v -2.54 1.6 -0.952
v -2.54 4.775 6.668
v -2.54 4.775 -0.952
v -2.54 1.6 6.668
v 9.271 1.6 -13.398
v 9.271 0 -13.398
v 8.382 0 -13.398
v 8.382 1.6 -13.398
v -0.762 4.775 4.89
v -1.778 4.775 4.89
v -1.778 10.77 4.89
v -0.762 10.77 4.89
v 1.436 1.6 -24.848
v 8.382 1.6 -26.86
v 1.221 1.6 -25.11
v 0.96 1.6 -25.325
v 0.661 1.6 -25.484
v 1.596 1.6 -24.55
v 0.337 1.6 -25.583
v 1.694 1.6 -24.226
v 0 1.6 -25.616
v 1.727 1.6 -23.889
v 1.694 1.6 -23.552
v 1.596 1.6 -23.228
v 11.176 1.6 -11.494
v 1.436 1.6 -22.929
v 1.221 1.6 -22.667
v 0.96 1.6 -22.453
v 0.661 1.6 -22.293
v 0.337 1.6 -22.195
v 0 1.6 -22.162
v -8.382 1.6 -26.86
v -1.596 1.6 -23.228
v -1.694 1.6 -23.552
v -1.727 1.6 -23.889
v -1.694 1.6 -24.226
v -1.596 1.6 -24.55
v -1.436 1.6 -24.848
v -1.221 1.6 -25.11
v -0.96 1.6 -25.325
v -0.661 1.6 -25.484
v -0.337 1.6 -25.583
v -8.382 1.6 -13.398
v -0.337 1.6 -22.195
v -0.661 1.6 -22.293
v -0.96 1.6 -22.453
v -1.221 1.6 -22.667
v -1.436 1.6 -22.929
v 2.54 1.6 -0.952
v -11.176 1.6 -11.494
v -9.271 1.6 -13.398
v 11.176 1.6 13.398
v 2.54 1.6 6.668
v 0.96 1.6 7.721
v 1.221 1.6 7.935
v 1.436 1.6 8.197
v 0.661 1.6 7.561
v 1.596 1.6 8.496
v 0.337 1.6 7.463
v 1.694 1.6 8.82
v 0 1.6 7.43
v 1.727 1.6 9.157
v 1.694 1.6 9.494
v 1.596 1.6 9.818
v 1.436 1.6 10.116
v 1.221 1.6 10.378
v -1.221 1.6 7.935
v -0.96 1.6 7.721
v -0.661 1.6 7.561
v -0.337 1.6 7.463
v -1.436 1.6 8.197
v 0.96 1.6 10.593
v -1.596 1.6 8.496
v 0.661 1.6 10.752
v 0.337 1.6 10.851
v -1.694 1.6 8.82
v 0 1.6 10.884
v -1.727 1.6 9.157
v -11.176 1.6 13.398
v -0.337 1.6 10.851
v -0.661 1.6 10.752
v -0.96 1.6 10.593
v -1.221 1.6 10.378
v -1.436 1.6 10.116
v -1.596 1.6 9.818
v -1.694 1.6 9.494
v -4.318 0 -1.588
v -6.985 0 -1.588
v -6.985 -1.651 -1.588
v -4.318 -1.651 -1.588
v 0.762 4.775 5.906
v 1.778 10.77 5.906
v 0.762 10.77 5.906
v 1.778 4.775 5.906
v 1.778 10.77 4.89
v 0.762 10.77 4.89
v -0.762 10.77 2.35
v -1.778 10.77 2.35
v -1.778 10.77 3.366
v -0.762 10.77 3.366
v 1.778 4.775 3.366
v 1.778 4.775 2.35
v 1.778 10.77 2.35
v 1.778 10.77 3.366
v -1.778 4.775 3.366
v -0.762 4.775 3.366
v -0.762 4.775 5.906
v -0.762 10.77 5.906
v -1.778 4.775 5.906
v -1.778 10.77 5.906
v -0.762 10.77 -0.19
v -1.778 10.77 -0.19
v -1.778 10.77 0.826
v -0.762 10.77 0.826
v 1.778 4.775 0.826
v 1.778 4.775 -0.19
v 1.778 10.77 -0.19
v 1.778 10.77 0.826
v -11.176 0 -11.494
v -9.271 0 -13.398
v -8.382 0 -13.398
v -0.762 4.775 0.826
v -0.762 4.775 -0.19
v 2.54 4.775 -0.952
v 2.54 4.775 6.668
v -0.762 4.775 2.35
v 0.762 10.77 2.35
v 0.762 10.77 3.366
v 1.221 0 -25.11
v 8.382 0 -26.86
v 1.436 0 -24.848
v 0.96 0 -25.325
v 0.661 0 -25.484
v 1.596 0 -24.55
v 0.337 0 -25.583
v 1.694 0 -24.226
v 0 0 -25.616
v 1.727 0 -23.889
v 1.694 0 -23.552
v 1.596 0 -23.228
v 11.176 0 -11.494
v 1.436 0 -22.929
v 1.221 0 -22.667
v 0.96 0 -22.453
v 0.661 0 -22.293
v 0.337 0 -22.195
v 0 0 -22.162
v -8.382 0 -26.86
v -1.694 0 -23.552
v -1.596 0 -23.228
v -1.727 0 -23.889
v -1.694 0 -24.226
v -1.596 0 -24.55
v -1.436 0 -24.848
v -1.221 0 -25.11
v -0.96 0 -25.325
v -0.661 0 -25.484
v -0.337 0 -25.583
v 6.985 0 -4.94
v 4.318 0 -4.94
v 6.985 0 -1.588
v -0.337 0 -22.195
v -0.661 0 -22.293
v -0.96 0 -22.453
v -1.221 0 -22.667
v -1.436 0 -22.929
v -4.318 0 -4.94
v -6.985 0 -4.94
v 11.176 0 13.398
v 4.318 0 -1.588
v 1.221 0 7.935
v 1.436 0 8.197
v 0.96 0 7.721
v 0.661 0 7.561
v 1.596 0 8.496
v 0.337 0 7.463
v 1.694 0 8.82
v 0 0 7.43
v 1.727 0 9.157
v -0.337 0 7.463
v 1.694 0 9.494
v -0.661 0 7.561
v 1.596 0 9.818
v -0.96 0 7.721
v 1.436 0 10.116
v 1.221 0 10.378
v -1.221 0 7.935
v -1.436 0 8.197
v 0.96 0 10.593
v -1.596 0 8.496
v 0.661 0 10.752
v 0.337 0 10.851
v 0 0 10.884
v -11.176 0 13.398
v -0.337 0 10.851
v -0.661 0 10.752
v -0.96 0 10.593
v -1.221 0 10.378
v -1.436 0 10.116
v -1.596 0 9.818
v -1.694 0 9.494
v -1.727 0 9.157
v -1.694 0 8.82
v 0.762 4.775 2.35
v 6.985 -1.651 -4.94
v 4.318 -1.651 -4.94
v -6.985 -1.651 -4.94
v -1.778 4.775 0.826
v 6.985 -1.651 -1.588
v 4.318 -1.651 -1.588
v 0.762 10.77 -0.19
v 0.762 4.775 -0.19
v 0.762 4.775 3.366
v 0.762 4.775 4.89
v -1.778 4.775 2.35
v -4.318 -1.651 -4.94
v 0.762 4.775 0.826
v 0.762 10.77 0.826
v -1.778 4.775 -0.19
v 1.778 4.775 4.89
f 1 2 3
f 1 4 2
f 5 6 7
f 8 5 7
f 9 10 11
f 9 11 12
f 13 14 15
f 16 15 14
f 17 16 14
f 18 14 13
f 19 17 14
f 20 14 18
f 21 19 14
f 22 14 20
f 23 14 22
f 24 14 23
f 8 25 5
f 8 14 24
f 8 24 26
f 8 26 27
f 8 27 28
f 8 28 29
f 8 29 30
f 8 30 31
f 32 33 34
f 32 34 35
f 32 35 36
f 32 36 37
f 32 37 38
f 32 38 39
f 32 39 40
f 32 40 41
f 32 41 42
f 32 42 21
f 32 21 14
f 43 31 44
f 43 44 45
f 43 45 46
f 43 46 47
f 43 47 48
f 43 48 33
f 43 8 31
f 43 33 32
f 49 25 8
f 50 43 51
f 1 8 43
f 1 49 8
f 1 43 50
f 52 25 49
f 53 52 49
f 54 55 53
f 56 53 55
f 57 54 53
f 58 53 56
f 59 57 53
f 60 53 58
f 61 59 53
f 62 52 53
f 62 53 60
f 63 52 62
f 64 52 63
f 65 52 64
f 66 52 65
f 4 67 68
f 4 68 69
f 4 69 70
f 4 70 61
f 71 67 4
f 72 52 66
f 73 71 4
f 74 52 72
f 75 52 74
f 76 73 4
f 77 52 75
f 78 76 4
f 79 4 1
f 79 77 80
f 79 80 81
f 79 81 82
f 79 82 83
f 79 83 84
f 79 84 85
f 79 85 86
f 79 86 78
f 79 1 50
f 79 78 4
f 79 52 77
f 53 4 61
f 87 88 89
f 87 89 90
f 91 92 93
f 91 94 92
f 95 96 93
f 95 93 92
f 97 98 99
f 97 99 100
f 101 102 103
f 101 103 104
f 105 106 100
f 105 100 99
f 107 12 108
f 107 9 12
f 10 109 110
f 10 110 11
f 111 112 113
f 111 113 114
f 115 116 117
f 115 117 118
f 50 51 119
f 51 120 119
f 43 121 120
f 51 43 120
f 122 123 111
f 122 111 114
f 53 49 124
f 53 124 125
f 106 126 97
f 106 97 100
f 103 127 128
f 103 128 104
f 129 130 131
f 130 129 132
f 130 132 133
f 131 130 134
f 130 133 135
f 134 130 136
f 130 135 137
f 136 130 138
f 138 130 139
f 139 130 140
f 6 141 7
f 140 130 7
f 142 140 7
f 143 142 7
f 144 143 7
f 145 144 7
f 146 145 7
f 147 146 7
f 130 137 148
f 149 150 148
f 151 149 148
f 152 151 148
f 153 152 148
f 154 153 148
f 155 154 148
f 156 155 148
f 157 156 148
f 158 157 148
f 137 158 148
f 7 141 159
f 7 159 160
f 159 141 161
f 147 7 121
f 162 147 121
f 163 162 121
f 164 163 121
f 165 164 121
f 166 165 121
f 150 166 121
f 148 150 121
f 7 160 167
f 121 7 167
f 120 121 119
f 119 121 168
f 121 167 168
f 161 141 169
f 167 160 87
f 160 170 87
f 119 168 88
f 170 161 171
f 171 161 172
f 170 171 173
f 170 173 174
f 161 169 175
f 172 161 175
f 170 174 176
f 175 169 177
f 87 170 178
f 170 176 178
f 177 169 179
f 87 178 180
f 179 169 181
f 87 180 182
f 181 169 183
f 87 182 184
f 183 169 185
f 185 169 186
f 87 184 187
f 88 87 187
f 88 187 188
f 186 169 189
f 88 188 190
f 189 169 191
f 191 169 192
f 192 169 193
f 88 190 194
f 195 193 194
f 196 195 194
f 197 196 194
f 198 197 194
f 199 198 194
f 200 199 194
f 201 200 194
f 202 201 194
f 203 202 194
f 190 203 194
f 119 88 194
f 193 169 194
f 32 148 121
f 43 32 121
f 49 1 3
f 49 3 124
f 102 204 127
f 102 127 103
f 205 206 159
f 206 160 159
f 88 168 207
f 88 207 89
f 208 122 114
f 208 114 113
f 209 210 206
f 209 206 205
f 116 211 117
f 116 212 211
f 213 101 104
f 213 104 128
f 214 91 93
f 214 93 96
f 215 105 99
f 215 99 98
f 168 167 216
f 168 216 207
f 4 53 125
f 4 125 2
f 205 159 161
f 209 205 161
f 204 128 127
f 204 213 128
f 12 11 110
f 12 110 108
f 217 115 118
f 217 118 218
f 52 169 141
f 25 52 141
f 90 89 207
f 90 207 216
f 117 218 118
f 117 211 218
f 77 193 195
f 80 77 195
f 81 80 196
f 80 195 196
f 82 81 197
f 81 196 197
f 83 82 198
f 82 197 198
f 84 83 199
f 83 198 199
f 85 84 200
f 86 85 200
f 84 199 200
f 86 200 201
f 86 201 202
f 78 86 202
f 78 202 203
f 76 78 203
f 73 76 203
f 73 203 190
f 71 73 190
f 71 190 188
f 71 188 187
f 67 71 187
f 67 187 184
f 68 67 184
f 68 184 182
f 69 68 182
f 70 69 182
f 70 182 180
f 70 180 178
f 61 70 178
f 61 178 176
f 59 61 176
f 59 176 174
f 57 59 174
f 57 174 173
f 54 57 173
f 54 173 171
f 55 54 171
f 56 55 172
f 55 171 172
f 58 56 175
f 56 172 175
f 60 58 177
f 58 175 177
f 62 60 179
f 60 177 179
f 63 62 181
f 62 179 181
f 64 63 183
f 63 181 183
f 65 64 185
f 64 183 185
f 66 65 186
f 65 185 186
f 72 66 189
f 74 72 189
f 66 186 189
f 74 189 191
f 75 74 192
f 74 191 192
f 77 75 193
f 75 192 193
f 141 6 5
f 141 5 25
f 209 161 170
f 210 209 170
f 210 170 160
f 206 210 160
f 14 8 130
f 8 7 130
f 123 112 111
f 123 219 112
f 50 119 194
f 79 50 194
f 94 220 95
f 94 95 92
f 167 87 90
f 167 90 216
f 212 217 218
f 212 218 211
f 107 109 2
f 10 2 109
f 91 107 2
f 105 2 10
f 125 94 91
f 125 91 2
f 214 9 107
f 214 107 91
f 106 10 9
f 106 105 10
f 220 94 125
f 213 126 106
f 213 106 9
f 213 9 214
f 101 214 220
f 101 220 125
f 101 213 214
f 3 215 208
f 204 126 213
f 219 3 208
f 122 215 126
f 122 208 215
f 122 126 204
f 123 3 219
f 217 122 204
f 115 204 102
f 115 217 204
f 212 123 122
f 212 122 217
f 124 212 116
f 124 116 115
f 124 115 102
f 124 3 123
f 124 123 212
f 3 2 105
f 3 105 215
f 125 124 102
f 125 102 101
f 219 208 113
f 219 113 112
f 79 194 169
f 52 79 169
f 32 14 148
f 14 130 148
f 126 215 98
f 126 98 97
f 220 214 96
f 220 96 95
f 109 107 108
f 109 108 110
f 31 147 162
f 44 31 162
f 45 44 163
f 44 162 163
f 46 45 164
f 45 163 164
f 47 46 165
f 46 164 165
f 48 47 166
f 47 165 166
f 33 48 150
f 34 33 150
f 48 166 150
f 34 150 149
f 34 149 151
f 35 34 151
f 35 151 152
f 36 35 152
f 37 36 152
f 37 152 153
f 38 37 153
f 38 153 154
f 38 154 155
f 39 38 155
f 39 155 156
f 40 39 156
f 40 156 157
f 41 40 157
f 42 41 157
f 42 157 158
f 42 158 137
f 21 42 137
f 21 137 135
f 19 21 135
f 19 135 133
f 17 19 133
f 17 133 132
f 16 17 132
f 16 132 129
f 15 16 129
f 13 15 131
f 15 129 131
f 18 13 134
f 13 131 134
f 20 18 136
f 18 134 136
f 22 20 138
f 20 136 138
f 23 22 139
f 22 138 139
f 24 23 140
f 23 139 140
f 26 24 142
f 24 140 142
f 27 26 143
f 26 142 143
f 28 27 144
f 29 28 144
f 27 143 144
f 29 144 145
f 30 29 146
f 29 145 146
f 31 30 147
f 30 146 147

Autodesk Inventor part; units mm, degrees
ref_plane "YZ Plane" through (0, 0, 0) normal (1, 0, 0) x (0, 1, 0)
ref_plane "XZ Plane" through (0, 0, 0) normal (0, 1, 0) x (-1, 0, 0)
ref_plane "XY Plane" through (0, 0, 0) normal (0, 0, 1) x (1, 0, 0)
sketch "Sketch1" plane through (0, 0, 0) normal (0, 1, 0) x (-1, 0, 0)
  line L0 (11.176, 13.3985) -> (-11.176, 13.3985)
  line L1 (-11.176, 13.3985) -> (-11.176, -11.4935)
  line L2 (11.176, -11.4935) -> (11.176, 13.3985)
  line L3 (11.176, 13.3985) -> (-11.176, -13.3985) construction
  line L4 (0, 20.6375) -> (0, -33.0464)
  line L5 (-8.382, -13.3985) -> (-8.382, -26.8605)
  line L6 (-8.382, -26.8605) -> (8.382, -26.8605)
  line L7 (8.382, -26.8605) -> (8.382, -13.3985)
  line L8 (9.271, -13.3985) -> (11.176, -11.4935)
  line L9 (-9.271, -13.3985) -> (-11.176, -11.4935)
  line L10 (-9.271, -13.3985) -> (-8.382, -13.3985)
  line L11 (8.382, -13.3985) -> (9.271, -13.3985)
  point P0 (0, 0)
  point P1 (11.176, -13.3985)
  point P2 (0, 0)
  dimension "d0" = 22.352
  dimension "d1" = 26.797
  dimension "d2" = 16.764
  dimension "d3" = 13.462
  dimension "d4" = 1.905
  dimension "d5" = 1.905
  dimension "d6" = 1.905
  dimension "d7" = 1.905
extrude "Extrusion1" add sketch "Sketch1" along normal blind 1.6002
sketch "Sketch2" plane through (0, 1.6002, 0) normal (0, 1, 0) x (1, 0, 0)
  line L0 (-11.176, -13.3985) -> (11.176, -13.3985) projected
  line L1 (8.382, 26.8605) -> (-8.382, 26.8605) projected
  line L2 (0, -15.1574) -> (0, 42.0562)
  line L3 (0, -15.1574) -> (57.2136, -15.1574) construction
  point P0 (0, 0)
  point P1 (0, -9.1567)
  point P2 (0, 23.8887)
  dimension "d10" = 4.2418
  dimension "d11" = 2.9718
  dimension "d12" = 90
hole "Hole1" at (0, 1.6002, 9.1567) at (0, 1.6002, -23.8887) direction (0, -1, 0) diameter 3.4544 end through all clearance for "Flat Head Machine Screw (82)" size "#5" standard "Ansi Unified Screw Threads"
sketch "Sketch3" plane through (0, 1.6002, 0) normal (0, 1, 0) x (1, 0, 0)
  line L0 (-2.54, 0.9525) -> (2.54, 0.9525)
  line L1 (2.54, 0.9525) -> (2.54, -6.6675)
  line L2 (2.54, -6.6675) -> (-2.54, -6.6675)
  line L3 (-2.54, -6.6675) -> (-2.54, 0.9525)
  line L4 (0, 0) -> (0, 29.7759)
  line L5 (0, 0) -> (29.7759, 0) construction
  line L6 (0, 0) -> (0, -24.9457)
  line L7 (0, 0) -> (24.9457, 0) construction
  line L8 (-2.54, 0.9525) -> (2.54, -6.6675) construction
  line L9 (-11.176, -13.3985) -> (11.176, -13.3985) construction
  point P0 (0, -2.8575)
  dimension "d20" = 90
  dimension "d21" = 90
  dimension "d22" = 10.541
  dimension "d23" = 5.08
  dimension "d24" = 7.62
extrude "Extrusion2" add sketch "Sketch3" along normal blind 3.175
sketch "Sketch4" plane through (0, 4.7752, 0) normal (0, 1, 0) x (1, 0, 0)
  line L0 (0, 1.9235) -> (0, -7.9336)
  line L1 (-5.0807, -2.8575) -> (5.7317, -2.8575)
  line L2 (2.54, 0.9525) -> (-2.54, 0.9525) projected
  line L3 (2.54, -6.6675) -> (2.54, 0.9525) projected
  line L4 (-1.778, 0.1905) -> (-0.762, 0.1905)
  line L5 (-0.762, 0.1905) -> (-0.762, -0.8255)
  line L6 (-0.762, -0.8255) -> (-1.778, -0.8255)
  line L7 (-1.778, -0.8255) -> (-1.778, 0.1905)
  point P0 (0, 0)
  point P1 (0, 0.9525)
  point P2 (2.54, -2.8575)
  dimension "d27" = 1.016
  dimension "d28" = 1.016
  dimension "d29" = 1.524
  dimension "d30" = 4.064
extrude "Extrusion3" add sketch "Sketch4" along normal blind 5.9944 contours L4 L5 L6 L7
pattern_linear "Rectangular Pattern1" count 2 spacing 2.54 along (1, 0, 0) count 3 spacing 2.54 along (0, 0, 1) of "Extrusion3"
sketch "Sketch5" plane through (0, 0, 0) normal (0, -1, 0) x (1, 0, 0)
  line L0 (0, 15.1213) -> (0, -35.4386)
  line L1 (6.985, -1.5875) -> (4.318, -1.5875)
  line L2 (4.318, -1.5875) -> (4.318, -4.9403)
  line L3 (4.318, -4.9403) -> (6.985, -4.9403)
  line L4 (6.985, -4.9403) -> (6.985, -1.5875)
  line L5 (-11.176, 13.3985) -> (11.176, 13.3985) projected
  line L6 (-4.318, -4.9403) -> (-6.985, -4.9403)
  line L7 (-6.985, -4.9403) -> (-6.985, -1.5875)
  line L8 (-6.985, -1.5875) -> (-4.318, -1.5875)
  line L9 (-4.318, -1.5875) -> (-4.318, -4.9403)
  point P0 (0, 0)
  dimension "d39" = 2.667
  dimension "d40" = 3.3528
  dimension "d41" = 8.636
  dimension "d42" = 14.986
  dimension "d43" = 8.636
extrude "Extrusion4" add sketch "Sketch5" along normal blind 1.651
equation "\"d5\" = d4"
equation "\"d6\" = d4"
equation "\"d7\" = d6"
equation "\"d43\" = d41"
properties part number "wheel_encoder"
